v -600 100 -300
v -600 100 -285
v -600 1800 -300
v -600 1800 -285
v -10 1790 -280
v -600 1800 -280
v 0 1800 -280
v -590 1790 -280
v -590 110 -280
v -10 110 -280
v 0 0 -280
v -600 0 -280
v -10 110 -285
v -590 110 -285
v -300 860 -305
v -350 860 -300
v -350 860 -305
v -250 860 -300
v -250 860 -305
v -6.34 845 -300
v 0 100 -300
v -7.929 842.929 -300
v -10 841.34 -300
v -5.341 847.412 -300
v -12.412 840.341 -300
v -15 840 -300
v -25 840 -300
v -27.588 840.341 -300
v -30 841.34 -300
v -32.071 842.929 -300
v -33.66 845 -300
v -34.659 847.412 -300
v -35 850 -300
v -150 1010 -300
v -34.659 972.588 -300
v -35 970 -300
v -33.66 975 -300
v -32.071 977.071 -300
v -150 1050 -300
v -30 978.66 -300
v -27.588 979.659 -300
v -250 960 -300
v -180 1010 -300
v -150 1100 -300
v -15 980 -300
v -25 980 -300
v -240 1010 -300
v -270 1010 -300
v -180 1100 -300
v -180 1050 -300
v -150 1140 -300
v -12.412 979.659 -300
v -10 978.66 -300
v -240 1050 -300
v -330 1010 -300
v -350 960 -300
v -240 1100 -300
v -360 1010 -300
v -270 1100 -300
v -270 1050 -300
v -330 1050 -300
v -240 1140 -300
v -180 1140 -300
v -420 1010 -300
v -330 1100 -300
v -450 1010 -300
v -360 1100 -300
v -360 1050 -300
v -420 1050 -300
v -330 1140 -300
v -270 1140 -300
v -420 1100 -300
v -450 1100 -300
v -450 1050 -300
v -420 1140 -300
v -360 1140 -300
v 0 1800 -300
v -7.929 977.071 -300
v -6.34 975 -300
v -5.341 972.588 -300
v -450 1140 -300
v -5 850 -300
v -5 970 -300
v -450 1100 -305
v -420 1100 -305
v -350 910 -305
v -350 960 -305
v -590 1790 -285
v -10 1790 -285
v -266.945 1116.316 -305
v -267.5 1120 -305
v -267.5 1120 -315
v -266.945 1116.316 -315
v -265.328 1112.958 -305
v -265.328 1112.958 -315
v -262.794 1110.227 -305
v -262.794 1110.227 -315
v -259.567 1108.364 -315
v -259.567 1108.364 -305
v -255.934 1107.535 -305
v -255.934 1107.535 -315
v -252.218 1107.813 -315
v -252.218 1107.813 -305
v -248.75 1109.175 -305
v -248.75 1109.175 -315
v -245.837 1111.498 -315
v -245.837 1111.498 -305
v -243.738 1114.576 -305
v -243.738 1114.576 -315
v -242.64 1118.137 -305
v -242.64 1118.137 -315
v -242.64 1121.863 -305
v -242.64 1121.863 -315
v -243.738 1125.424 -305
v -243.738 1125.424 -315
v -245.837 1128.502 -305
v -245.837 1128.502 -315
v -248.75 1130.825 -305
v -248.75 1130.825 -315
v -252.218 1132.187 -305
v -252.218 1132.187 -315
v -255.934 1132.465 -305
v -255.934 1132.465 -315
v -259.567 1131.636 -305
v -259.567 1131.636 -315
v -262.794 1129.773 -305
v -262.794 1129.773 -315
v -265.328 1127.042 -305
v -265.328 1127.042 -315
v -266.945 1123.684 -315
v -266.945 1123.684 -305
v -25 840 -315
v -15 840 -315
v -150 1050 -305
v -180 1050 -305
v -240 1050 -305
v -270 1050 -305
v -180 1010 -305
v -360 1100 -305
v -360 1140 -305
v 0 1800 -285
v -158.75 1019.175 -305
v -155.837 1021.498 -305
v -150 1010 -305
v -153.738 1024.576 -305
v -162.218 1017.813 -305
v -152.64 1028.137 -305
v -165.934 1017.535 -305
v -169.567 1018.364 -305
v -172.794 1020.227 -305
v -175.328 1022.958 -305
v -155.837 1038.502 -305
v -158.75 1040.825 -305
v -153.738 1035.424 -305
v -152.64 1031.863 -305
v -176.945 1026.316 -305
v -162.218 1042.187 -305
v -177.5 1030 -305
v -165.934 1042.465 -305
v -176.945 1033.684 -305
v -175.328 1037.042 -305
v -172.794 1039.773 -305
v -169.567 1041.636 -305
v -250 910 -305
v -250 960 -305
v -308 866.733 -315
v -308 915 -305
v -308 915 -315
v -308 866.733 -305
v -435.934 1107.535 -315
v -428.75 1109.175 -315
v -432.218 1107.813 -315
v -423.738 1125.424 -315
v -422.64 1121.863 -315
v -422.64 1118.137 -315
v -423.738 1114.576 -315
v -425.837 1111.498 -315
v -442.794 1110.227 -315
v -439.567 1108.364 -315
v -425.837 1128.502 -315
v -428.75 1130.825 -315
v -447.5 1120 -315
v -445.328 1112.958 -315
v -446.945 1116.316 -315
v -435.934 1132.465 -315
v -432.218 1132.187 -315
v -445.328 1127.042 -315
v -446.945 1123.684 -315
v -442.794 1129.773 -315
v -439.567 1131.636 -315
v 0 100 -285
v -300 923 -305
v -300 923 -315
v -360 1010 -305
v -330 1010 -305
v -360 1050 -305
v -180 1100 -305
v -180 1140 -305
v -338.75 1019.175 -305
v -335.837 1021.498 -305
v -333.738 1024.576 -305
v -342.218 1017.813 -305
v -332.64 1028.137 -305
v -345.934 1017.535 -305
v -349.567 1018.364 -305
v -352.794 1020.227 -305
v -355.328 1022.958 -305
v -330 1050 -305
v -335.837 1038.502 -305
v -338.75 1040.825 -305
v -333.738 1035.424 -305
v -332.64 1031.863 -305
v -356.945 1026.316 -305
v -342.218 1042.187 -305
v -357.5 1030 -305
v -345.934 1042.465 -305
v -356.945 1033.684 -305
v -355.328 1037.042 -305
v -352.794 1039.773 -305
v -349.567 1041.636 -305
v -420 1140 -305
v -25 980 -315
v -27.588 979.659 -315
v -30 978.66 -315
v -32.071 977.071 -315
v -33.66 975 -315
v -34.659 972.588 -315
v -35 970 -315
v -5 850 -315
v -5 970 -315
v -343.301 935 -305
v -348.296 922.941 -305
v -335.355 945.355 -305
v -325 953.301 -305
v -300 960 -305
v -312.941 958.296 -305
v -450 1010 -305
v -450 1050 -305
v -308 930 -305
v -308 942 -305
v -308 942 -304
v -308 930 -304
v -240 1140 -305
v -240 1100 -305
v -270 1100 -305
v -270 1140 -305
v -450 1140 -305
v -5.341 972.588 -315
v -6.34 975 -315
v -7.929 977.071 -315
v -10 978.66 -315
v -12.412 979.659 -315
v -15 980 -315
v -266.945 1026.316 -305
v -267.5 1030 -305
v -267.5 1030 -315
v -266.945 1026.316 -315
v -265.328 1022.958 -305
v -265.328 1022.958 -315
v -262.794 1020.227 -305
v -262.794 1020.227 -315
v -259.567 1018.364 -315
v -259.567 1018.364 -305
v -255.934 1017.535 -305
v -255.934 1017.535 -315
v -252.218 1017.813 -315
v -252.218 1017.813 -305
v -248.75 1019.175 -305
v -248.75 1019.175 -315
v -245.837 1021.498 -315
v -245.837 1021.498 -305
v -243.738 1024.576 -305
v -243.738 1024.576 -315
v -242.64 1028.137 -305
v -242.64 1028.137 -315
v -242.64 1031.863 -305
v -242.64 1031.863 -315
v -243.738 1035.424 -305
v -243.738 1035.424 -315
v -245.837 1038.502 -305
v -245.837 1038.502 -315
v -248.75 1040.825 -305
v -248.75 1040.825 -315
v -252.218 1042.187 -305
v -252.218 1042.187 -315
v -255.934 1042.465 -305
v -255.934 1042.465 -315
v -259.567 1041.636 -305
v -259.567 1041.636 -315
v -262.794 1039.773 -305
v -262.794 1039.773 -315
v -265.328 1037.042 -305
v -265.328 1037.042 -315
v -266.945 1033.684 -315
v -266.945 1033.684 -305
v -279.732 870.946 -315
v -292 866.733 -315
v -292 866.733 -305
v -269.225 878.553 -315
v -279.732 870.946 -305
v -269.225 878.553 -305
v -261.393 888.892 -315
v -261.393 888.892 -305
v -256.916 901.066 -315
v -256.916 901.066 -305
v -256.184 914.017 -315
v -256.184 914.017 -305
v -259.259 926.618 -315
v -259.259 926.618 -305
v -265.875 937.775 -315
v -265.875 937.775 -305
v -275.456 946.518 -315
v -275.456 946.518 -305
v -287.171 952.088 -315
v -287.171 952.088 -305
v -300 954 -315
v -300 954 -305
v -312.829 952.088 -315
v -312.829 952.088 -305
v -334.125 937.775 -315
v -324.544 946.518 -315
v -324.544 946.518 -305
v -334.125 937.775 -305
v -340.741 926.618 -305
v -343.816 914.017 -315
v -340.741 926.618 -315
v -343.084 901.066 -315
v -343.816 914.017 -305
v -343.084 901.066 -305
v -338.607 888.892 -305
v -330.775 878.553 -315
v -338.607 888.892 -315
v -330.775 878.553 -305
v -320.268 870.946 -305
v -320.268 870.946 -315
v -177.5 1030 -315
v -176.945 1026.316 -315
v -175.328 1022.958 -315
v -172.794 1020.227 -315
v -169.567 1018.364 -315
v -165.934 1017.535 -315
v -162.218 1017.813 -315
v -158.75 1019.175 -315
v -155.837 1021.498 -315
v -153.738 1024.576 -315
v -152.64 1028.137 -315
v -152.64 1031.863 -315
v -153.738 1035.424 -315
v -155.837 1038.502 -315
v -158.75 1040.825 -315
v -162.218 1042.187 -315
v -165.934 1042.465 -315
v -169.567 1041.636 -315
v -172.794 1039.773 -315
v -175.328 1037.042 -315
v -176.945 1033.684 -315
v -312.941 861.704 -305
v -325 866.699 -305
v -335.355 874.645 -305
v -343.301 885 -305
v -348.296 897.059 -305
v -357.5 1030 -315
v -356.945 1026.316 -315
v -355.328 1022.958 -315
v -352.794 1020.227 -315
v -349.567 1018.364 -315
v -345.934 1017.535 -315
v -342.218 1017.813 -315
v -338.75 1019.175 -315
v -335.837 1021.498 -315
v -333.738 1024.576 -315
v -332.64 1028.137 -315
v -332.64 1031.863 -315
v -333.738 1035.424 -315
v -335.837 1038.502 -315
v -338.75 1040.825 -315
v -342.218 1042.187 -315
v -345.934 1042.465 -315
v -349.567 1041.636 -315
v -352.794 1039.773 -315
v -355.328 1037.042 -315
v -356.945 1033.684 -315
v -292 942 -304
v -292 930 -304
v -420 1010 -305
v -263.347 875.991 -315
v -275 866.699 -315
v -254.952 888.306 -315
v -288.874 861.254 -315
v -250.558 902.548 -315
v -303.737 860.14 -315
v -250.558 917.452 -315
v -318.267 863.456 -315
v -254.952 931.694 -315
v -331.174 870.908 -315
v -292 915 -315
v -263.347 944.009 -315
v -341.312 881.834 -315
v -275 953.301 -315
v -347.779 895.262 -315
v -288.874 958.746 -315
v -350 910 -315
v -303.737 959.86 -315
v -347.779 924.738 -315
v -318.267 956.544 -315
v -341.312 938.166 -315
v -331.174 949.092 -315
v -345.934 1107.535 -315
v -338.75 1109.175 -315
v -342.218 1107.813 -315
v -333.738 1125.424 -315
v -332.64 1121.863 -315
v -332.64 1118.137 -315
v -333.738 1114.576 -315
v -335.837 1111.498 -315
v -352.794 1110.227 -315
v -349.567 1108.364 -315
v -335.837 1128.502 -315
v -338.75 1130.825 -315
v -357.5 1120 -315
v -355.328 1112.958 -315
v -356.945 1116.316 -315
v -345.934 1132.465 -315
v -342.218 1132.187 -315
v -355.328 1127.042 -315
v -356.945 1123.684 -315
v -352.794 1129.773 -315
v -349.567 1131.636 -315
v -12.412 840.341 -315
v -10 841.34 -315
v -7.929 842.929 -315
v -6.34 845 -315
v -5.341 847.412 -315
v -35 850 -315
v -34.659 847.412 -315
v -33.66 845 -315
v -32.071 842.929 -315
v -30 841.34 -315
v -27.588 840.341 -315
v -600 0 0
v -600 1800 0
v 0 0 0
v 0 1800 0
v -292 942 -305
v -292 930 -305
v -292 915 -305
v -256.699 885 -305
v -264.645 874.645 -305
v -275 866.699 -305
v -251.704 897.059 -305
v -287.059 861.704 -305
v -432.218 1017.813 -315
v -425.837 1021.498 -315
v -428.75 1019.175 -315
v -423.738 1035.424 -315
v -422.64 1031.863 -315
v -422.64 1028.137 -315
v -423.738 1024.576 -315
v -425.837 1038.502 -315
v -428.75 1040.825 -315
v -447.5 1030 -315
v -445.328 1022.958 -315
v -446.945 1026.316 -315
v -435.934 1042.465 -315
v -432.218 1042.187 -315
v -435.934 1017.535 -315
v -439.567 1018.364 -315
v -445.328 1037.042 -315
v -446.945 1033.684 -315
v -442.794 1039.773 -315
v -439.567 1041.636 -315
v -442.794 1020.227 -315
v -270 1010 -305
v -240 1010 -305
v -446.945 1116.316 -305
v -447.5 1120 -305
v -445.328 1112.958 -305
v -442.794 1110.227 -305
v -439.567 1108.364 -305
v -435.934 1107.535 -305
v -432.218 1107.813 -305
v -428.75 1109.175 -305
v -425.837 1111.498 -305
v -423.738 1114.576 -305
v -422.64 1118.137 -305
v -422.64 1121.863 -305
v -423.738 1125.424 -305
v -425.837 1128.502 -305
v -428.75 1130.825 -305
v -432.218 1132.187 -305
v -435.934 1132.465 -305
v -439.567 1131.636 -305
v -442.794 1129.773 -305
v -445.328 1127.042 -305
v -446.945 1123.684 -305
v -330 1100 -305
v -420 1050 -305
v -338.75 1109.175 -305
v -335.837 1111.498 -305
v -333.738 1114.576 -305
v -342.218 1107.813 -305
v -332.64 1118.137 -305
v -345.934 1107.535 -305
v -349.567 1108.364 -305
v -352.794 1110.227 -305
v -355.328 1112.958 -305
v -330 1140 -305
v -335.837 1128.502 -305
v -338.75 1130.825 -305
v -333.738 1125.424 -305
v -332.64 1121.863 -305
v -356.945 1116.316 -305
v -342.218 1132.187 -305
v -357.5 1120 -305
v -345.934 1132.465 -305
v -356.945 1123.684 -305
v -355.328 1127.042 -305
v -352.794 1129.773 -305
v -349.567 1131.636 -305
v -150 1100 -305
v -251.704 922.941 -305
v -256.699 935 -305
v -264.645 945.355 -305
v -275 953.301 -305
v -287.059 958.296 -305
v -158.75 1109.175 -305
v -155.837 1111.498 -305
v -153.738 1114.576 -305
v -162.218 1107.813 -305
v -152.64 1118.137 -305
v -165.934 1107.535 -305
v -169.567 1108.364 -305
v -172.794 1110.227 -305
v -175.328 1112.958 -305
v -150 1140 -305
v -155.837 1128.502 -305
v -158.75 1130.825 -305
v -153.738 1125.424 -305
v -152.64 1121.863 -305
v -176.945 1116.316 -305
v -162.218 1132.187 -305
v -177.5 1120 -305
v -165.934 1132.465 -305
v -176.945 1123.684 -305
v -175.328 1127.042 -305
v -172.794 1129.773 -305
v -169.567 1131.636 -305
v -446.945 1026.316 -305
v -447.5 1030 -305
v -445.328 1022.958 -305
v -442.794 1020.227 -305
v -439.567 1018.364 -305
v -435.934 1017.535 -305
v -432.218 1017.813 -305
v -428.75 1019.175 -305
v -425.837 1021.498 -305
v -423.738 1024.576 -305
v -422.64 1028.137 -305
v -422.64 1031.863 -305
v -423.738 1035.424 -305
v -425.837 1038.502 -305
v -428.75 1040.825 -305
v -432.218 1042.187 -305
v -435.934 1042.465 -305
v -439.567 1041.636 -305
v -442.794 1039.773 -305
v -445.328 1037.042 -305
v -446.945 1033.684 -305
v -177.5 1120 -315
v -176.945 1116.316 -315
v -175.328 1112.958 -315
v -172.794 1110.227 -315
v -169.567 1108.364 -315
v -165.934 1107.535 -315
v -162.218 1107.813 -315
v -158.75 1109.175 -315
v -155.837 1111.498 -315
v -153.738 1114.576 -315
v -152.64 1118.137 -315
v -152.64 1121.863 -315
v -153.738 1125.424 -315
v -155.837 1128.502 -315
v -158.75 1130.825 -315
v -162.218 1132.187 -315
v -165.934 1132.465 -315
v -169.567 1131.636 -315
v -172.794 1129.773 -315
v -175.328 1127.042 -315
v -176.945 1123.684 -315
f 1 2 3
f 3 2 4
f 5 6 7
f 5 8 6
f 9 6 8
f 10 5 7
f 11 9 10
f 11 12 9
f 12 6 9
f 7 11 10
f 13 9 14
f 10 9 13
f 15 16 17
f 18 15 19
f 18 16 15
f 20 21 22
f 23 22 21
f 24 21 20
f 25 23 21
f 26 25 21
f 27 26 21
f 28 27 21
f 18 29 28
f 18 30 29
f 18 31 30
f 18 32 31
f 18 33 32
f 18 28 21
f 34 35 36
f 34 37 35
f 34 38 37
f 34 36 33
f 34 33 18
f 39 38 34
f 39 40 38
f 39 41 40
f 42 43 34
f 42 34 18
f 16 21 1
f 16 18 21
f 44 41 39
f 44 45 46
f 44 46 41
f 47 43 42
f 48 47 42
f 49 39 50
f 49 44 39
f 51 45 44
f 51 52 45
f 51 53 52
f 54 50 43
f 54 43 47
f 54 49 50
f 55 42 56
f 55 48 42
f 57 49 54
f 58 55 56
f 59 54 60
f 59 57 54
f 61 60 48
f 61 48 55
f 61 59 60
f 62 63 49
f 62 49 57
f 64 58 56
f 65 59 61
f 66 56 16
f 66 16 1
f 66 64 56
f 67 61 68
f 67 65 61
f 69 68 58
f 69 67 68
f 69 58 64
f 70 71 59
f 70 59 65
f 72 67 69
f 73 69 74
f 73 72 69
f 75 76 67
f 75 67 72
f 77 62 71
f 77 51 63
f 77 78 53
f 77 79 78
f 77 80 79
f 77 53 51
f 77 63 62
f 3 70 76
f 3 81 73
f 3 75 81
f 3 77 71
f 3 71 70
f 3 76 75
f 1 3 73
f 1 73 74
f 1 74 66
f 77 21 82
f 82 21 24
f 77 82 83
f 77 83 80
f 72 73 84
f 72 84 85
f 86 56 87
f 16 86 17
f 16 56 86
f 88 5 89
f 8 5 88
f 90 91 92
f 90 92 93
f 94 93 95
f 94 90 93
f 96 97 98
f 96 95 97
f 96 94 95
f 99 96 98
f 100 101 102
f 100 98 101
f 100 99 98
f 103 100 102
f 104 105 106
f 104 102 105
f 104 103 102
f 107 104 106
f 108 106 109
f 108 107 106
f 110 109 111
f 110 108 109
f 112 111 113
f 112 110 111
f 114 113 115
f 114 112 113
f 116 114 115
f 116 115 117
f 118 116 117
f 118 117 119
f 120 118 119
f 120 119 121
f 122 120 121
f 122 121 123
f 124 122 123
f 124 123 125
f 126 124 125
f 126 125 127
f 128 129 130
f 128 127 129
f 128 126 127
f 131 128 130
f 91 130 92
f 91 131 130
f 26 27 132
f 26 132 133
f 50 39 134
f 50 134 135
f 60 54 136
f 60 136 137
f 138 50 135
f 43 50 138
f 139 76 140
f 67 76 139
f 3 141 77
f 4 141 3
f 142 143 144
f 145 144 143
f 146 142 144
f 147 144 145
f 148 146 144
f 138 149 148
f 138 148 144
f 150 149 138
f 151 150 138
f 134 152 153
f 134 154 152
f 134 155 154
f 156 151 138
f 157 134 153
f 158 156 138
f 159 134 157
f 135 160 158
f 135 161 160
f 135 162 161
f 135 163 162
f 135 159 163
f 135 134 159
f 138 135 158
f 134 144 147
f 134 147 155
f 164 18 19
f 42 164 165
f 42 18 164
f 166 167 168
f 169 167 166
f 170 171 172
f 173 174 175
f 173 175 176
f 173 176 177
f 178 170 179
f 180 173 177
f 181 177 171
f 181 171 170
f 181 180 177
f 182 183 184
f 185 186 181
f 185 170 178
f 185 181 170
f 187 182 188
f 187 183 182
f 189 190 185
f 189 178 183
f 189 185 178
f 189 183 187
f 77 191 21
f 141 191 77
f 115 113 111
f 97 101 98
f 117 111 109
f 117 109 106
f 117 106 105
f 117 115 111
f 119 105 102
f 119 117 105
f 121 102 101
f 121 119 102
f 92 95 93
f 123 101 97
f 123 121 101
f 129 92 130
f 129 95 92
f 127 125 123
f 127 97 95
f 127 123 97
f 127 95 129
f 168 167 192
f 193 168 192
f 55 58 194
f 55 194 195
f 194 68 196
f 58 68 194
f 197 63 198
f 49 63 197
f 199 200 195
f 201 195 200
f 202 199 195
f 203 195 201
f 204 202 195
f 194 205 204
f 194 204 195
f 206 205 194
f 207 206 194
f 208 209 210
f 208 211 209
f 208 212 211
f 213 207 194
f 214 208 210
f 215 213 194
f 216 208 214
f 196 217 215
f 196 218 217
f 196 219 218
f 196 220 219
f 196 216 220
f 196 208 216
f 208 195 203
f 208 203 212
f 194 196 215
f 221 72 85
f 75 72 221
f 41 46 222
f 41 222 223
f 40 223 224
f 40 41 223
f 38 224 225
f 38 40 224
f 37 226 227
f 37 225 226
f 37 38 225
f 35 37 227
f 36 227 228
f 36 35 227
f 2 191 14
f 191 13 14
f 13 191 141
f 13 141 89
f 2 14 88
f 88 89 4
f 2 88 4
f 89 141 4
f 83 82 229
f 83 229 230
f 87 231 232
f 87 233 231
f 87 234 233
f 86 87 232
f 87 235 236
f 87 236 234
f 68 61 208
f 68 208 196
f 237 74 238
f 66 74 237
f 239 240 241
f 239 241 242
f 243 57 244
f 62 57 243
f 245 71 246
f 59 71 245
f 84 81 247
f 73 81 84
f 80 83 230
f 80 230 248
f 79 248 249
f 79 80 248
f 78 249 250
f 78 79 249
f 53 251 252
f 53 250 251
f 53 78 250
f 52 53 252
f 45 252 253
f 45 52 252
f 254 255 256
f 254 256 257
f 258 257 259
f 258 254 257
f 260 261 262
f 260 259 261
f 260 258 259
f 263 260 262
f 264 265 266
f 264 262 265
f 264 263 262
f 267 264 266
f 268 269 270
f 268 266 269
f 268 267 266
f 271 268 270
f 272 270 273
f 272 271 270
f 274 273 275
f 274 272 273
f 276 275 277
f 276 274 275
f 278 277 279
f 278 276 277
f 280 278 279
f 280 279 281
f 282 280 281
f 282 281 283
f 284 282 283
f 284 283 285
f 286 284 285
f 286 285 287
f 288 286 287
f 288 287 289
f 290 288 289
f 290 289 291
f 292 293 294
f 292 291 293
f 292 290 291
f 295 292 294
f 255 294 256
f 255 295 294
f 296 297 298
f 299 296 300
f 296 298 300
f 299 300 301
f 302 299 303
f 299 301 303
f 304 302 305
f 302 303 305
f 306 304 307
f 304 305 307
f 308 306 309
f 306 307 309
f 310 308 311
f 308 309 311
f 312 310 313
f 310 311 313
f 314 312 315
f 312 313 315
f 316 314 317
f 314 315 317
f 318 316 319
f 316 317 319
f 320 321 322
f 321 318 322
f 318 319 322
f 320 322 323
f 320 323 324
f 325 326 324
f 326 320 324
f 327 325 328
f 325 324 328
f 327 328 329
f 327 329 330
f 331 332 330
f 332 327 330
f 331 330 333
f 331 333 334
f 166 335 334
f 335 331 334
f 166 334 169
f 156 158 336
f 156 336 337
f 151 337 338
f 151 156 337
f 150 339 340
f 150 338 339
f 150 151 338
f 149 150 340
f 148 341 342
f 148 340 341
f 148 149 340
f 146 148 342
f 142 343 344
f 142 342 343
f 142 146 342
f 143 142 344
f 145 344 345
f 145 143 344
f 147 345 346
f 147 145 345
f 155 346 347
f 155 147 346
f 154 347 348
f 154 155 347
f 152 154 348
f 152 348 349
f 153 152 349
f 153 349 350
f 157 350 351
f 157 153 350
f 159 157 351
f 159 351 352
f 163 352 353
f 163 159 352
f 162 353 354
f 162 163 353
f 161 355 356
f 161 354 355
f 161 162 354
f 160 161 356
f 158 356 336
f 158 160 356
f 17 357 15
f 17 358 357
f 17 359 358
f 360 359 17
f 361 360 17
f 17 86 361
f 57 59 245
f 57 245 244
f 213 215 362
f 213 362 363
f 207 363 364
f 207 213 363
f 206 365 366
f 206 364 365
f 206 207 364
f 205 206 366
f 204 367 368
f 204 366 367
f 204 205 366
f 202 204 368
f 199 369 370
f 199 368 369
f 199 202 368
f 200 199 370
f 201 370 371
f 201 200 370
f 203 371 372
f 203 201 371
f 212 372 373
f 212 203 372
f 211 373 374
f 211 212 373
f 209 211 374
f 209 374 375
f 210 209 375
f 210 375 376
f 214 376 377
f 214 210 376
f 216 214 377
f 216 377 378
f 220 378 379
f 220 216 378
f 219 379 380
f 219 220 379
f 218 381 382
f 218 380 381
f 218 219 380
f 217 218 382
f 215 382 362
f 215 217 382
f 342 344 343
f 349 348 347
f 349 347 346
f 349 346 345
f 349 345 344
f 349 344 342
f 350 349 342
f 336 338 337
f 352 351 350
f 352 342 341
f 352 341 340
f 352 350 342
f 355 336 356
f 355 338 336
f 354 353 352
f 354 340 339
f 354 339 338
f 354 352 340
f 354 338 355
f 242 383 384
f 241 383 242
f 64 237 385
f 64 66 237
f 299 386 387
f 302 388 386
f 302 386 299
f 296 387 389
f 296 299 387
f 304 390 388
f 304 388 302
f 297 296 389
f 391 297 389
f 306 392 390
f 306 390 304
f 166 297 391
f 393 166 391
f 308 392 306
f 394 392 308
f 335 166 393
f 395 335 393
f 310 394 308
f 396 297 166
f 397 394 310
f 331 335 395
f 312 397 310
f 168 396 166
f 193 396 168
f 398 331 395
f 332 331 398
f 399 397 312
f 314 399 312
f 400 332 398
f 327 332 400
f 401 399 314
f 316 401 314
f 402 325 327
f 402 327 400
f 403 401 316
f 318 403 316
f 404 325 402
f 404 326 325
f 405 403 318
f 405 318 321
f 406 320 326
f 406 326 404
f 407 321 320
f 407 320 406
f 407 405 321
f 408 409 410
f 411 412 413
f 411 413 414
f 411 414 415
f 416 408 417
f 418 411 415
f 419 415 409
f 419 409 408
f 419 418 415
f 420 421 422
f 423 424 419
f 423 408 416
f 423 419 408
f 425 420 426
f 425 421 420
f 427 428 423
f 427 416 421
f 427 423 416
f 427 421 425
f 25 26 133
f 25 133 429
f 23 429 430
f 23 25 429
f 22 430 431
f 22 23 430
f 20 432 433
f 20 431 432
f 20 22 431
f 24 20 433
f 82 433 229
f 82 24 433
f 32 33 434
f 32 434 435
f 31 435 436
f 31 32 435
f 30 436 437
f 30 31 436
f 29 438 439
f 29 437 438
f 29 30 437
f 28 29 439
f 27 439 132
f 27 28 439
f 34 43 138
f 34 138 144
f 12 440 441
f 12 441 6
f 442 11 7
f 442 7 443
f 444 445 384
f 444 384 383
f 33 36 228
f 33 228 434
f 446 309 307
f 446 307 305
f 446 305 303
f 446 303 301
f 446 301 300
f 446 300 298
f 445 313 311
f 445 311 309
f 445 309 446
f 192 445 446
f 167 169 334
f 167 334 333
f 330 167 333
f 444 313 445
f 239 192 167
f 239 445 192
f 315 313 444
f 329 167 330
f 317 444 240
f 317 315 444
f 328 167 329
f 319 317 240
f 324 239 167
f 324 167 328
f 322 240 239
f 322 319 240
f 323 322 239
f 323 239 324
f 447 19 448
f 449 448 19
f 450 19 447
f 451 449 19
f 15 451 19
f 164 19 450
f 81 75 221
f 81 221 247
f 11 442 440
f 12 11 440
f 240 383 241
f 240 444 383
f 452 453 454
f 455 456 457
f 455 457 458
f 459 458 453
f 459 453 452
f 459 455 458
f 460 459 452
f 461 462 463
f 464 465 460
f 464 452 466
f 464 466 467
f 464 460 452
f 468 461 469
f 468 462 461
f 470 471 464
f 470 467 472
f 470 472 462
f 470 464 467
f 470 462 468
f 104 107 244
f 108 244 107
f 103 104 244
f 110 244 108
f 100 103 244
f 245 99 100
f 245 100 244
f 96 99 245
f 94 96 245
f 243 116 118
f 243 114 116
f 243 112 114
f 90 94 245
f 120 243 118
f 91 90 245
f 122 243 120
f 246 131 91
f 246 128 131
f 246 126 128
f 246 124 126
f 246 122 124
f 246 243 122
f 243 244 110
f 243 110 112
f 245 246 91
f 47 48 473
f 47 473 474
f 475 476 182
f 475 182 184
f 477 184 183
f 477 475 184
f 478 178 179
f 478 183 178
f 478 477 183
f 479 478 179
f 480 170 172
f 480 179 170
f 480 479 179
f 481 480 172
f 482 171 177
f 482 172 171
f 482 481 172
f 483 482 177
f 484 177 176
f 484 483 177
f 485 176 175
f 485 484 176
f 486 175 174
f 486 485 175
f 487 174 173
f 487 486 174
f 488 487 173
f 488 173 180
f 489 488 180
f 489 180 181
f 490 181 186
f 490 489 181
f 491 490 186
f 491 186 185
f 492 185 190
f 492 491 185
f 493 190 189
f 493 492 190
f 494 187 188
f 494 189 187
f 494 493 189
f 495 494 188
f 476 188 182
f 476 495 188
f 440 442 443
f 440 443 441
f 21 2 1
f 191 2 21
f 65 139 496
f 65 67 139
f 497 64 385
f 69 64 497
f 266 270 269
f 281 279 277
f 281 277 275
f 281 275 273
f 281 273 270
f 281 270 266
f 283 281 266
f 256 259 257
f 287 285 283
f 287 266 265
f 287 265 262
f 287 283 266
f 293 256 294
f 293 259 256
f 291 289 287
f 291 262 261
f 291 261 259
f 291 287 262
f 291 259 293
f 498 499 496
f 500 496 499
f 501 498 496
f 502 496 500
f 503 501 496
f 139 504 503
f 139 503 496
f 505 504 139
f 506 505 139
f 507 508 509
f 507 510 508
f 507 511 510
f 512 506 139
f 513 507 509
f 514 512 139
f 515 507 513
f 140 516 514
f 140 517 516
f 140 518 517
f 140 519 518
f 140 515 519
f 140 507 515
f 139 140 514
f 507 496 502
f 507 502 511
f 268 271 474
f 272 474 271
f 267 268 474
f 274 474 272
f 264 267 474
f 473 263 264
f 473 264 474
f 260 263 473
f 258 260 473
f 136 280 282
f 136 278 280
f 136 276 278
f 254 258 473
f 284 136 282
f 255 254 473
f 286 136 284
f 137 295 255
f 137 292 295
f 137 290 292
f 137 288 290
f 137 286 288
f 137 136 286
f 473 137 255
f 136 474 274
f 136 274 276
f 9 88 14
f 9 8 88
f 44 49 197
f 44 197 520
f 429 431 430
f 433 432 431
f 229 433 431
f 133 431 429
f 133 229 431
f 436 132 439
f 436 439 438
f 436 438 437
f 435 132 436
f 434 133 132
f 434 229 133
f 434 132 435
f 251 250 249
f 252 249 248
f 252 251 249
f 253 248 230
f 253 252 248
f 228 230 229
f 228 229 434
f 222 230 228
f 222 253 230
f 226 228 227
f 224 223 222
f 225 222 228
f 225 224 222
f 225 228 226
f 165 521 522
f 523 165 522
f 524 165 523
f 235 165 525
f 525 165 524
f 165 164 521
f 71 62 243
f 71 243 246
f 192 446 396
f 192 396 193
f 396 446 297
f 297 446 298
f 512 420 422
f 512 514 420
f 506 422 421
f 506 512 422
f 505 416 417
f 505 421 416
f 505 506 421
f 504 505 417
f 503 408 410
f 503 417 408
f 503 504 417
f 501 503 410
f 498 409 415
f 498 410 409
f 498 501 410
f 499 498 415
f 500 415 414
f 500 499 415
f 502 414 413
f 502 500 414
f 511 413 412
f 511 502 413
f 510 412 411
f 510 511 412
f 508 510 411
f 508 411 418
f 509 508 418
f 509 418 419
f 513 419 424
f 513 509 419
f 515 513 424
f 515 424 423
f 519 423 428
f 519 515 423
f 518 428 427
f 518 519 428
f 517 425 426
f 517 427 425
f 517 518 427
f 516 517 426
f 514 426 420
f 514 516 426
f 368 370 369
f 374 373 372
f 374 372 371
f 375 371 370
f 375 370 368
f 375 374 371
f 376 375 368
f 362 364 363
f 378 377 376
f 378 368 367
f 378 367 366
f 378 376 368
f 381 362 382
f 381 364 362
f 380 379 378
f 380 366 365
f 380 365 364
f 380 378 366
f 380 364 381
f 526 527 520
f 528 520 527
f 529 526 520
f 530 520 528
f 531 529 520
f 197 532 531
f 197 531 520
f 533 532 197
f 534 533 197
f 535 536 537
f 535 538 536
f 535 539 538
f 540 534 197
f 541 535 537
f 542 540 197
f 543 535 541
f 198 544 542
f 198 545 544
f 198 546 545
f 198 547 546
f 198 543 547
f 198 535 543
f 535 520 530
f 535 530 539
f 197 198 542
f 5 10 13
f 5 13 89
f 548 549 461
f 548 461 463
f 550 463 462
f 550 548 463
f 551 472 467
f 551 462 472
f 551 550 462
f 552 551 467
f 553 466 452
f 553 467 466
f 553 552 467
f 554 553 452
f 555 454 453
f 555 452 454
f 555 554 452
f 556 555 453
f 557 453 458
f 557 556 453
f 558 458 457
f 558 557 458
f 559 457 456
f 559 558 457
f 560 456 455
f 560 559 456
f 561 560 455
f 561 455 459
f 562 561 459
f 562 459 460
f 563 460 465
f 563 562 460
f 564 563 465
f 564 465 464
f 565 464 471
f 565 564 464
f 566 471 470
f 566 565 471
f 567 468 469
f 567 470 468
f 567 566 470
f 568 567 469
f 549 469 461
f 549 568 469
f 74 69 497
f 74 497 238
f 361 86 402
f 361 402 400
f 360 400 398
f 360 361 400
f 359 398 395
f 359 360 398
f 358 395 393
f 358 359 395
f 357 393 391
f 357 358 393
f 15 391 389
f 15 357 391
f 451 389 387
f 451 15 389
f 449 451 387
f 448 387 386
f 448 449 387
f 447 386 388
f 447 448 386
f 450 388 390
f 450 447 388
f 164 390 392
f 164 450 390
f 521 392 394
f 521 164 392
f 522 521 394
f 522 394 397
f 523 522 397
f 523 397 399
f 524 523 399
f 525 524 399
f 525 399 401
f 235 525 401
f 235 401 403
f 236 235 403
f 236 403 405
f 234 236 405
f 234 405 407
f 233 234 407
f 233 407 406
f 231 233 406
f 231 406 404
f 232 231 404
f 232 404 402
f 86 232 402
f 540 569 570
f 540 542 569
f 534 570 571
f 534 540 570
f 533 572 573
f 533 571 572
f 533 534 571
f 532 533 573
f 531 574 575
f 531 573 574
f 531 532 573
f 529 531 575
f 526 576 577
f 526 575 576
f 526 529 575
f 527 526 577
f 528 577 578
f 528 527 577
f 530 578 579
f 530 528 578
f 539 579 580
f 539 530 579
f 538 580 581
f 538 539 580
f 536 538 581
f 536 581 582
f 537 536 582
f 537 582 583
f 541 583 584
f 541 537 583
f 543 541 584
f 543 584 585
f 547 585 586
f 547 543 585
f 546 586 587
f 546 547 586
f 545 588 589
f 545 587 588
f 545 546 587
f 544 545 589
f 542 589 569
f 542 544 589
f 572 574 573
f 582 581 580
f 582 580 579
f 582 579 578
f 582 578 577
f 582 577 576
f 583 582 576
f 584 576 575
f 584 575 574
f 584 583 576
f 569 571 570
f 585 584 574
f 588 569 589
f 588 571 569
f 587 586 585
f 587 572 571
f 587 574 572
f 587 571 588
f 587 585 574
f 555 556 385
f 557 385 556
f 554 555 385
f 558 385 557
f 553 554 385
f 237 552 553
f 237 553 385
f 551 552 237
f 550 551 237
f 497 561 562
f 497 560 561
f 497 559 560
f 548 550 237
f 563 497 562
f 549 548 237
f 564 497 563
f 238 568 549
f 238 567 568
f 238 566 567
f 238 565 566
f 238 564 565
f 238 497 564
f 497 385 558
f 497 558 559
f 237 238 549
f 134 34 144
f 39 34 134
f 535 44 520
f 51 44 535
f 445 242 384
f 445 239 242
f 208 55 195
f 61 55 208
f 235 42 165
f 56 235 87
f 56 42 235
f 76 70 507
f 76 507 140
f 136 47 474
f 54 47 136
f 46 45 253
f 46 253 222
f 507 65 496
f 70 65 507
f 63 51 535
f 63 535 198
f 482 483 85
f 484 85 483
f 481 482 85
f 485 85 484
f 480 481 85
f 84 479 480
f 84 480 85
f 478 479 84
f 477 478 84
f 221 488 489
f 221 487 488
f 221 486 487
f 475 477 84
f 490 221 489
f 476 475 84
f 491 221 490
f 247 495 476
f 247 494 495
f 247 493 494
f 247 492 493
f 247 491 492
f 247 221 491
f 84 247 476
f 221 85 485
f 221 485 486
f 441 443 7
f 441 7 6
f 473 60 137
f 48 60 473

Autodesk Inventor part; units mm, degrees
ref_plane "YZ Plane" through (0, 0, 0) normal (1, 0, 0) x (0, 1, 0)
ref_plane "XZ Plane" through (0, 0, 0) normal (0, 1, 0) x (-1, 0, 0)
ref_plane "XY Plane" through (0, 0, 0) normal (0, 0, 1) x (1, 0, 0)
sketch "Skizze1" plane through (0, 0, 0) normal (0, 1, 0) x (-1, 0, 0)
  line L0 (0, 0) -> (600, 0)
  line L1 (600, 0) -> (600, -280)
  line L2 (600, -280) -> (0, -280)
  line L3 (0, -280) -> (0, 0)
  dimension "d0" = 600
  dimension "d1" = 280
extrude "Extrusion1" add sketch "Skizze1" along normal blind 1800
sketch "Skizze2" plane through (0, 0, -280) normal (0, 0, -1) x (-1, 0, 0)
  line L0 (10, 1790) -> (590, 1790)
  line L1 (590, 1790) -> (590, 110)
  line L2 (590, 110) -> (10, 110)
  line L3 (10, 110) -> (10, 1790)
  line L4 (0, 0) -> (0, 1800) projected
  line L5 (600, 0) -> (600, 1800) projected
  line L6 (0, 1800) -> (600, 1800) projected
  line L7 (0, 0) -> (600, 0) projected
  dimension "d4" = 10
  dimension "d5" = 10
  dimension "d6" = 10
  dimension "d7" = 110
extrude "Extrusion2" add sketch "Skizze2" along normal blind 5 contours L0 L1 L2 L3
sketch "Skizze3" plane through (0, 0, -285) normal (0, 0, -1) x (-1, 0, 0)
  line L0 (0, 0) -> (0, 1800) projected
  line L1 (600, 0) -> (600, 1800) projected
  line L2 (0, 1800) -> (600, 1800)
  line L3 (600, 1800) -> (600, 100)
  line L4 (600, 100) -> (0, 100)
  line L5 (0, 100) -> (0, 1800)
  line L6 (10, 110) -> (590, 110) projected
  point P0 (0, 100)
  dimension "d10" = 10
extrude "Extrusion3" add sketch "Skizze3" along normal blind 15
sketch "Skizze4" plane through (0, 0, -300) normal (0, 0, -1) x (-1, 0, 0)
  line L0 (15, 980) -> (25, 980)
  line L1 (35, 970) -> (35, 850)
  line L2 (25, 840) -> (15, 840)
  line L3 (5, 850) -> (5, 970)
  line L4 (0, 0) -> (600, 0) projected
  line L5 (0, 1800) -> (0, 100) projected
  arc A0 (5, 850) -> (15, 840) centre (15, 850) ccw
  arc A1 (25, 840) -> (35, 850) centre (25, 850) ccw
  arc A2 (35, 970) -> (25, 980) centre (25, 970) ccw
  arc A3 (15, 980) -> (5, 970) centre (15, 970) ccw
  dimension "d13" = 840
  dimension "d14" = 140
  dimension "d15" = 30
  dimension "d16" = 5
  dimension "d17" = 10
extrude "Extrusion4" add sketch "Skizze4" along normal blind 15
sketch "Skizze5" plane through (0, 0, -300) normal (0, 0, -1) x (-1, 0, 0)
  line L0 (150, 1140) -> (180, 1140)
  line L1 (180, 1140) -> (180, 1100)
  line L2 (180, 1100) -> (150, 1100)
  line L3 (150, 1100) -> (150, 1140)
  line L4 (0, 100) -> (600, 100) projected
  line L5 (0, 1800) -> (0, 100) projected
  line L6 (240, 1140) -> (270, 1140)
  line L7 (270, 1140) -> (270, 1100)
  line L8 (270, 1100) -> (240, 1100)
  line L9 (240, 1100) -> (240, 1140)
  line L10 (330, 1140) -> (360, 1140)
  line L11 (360, 1140) -> (360, 1100)
  line L12 (360, 1100) -> (330, 1100)
  line L13 (330, 1100) -> (330, 1140)
  line L14 (420, 1140) -> (450, 1140)
  line L15 (450, 1140) -> (450, 1100)
  line L16 (450, 1100) -> (420, 1100)
  line L17 (420, 1100) -> (420, 1140)
  line L18 (150, 1050) -> (180, 1050)
  line L19 (180, 1050) -> (180, 1010)
  line L20 (180, 1010) -> (150, 1010)
  line L21 (150, 1010) -> (150, 1050)
  line L22 (240, 1050) -> (270, 1050)
  line L23 (270, 1050) -> (270, 1010)
  line L24 (270, 1010) -> (240, 1010)
  line L25 (240, 1010) -> (240, 1050)
  line L26 (330, 1050) -> (360, 1050)
  line L27 (360, 1050) -> (360, 1010)
  line L28 (360, 1010) -> (330, 1010)
  line L29 (330, 1010) -> (330, 1050)
  line L30 (420, 1050) -> (450, 1050)
  line L31 (450, 1050) -> (450, 1010)
  line L32 (450, 1010) -> (420, 1010)
  line L33 (420, 1010) -> (420, 1050)
  line L34 (250, 960) -> (350, 960)
  line L35 (350, 960) -> (350, 860)
  line L36 (350, 860) -> (250, 860)
  line L37 (250, 860) -> (250, 960)
  point P0 (0, 0)
  dimension "d20" = 40
  dimension "d21" = 30
  dimension "d22" = 1000
  dimension "d23" = 150
  dimension "d33" = 90
  dimension "d36" = 90
  dimension "d39" = 100
  dimension "d40" = 100
  dimension "d41" = 250
  dimension "d42" = 50
extrude "Extrusion5" add sketch "Skizze5" along normal blind 5
sketch "Skizze6" plane through (0, 0, -305) normal (0, 0, -1) x (-1, 0, 0)
  circle A0 centre (165, 1120) radius 12.5
  line L0 (180, 1140) -> (150, 1140) projected
  line L1 (180, 1100) -> (180, 1140) projected
  circle A1 centre (255, 1120) radius 12.5
  circle A2 centre (345, 1120) radius 12.5
  circle A3 centre (435, 1120) radius 12.5
  circle A4 centre (165, 1030) radius 12.5
  circle A5 centre (255, 1030) radius 12.5
  circle A6 centre (345, 1030) radius 12.5
  circle A7 centre (435, 1030) radius 12.5
  circle A8 centre (300, 910) radius 50
  line L2 (350, 860) -> (350, 960) projected
  line L3 (350, 960) -> (250, 960) projected
  arc A9 (308, 866.7334) -> (292, 866.7334) centre (300, 910) ccw
  line L4 (292, 915) -> (292, 866.7334)
  line L5 (308, 915) -> (308, 866.7334)
  line L6 (292, 915) -> (300, 923)
  line L7 (292, 915) -> (303.3137, 915) construction
  line L8 (308, 915) -> (300, 923)
  line L9 (308, 915) -> (319.3137, 915) construction
  point P0 (0, 0)
  dimension "d45" = 25
  dimension "d46" = 20
  dimension "d47" = 15
  dimension "d50" = 90
  dimension "d53" = 90
  dimension "d68" = 100
  dimension "d69" = 88
  dimension "d70" = 45
  dimension "d71" = 135
  dimension "d72" = 8
  dimension "d73" = 8
  dimension "d74" = 5
extrude "Extrusion6" add sketch "Skizze6" along normal blind 10 contours A0 | A1 | A2 | A3 | A4 | A5 | A6 | A7 | A8
sketch "Skizze7" plane through (0, 0, -305) normal (0, 0, -1) x (-1, 0, 0)
  line L0 (292, 942) -> (308, 942)
  line L1 (308, 942) -> (308, 930)
  line L2 (308, 930) -> (292, 930)
  line L3 (292, 930) -> (292, 942)
  line L4 (308, 866.7334) -> (308, 915) projected
  line L5 (292, 915) -> (292, 866.7334) projected
  point P0 (0, 0)
  point P1 (300, 923)
  dimension "d75" = 7
  dimension "d76" = 12
extrude "Extrusion7" cut sketch "Skizze7" against normal blind 1
equation "\"d5\" = d4"
equation "\"d6\" = d5"
equation "\"d73\" = d72"
properties part number "Schaltschrank2"
